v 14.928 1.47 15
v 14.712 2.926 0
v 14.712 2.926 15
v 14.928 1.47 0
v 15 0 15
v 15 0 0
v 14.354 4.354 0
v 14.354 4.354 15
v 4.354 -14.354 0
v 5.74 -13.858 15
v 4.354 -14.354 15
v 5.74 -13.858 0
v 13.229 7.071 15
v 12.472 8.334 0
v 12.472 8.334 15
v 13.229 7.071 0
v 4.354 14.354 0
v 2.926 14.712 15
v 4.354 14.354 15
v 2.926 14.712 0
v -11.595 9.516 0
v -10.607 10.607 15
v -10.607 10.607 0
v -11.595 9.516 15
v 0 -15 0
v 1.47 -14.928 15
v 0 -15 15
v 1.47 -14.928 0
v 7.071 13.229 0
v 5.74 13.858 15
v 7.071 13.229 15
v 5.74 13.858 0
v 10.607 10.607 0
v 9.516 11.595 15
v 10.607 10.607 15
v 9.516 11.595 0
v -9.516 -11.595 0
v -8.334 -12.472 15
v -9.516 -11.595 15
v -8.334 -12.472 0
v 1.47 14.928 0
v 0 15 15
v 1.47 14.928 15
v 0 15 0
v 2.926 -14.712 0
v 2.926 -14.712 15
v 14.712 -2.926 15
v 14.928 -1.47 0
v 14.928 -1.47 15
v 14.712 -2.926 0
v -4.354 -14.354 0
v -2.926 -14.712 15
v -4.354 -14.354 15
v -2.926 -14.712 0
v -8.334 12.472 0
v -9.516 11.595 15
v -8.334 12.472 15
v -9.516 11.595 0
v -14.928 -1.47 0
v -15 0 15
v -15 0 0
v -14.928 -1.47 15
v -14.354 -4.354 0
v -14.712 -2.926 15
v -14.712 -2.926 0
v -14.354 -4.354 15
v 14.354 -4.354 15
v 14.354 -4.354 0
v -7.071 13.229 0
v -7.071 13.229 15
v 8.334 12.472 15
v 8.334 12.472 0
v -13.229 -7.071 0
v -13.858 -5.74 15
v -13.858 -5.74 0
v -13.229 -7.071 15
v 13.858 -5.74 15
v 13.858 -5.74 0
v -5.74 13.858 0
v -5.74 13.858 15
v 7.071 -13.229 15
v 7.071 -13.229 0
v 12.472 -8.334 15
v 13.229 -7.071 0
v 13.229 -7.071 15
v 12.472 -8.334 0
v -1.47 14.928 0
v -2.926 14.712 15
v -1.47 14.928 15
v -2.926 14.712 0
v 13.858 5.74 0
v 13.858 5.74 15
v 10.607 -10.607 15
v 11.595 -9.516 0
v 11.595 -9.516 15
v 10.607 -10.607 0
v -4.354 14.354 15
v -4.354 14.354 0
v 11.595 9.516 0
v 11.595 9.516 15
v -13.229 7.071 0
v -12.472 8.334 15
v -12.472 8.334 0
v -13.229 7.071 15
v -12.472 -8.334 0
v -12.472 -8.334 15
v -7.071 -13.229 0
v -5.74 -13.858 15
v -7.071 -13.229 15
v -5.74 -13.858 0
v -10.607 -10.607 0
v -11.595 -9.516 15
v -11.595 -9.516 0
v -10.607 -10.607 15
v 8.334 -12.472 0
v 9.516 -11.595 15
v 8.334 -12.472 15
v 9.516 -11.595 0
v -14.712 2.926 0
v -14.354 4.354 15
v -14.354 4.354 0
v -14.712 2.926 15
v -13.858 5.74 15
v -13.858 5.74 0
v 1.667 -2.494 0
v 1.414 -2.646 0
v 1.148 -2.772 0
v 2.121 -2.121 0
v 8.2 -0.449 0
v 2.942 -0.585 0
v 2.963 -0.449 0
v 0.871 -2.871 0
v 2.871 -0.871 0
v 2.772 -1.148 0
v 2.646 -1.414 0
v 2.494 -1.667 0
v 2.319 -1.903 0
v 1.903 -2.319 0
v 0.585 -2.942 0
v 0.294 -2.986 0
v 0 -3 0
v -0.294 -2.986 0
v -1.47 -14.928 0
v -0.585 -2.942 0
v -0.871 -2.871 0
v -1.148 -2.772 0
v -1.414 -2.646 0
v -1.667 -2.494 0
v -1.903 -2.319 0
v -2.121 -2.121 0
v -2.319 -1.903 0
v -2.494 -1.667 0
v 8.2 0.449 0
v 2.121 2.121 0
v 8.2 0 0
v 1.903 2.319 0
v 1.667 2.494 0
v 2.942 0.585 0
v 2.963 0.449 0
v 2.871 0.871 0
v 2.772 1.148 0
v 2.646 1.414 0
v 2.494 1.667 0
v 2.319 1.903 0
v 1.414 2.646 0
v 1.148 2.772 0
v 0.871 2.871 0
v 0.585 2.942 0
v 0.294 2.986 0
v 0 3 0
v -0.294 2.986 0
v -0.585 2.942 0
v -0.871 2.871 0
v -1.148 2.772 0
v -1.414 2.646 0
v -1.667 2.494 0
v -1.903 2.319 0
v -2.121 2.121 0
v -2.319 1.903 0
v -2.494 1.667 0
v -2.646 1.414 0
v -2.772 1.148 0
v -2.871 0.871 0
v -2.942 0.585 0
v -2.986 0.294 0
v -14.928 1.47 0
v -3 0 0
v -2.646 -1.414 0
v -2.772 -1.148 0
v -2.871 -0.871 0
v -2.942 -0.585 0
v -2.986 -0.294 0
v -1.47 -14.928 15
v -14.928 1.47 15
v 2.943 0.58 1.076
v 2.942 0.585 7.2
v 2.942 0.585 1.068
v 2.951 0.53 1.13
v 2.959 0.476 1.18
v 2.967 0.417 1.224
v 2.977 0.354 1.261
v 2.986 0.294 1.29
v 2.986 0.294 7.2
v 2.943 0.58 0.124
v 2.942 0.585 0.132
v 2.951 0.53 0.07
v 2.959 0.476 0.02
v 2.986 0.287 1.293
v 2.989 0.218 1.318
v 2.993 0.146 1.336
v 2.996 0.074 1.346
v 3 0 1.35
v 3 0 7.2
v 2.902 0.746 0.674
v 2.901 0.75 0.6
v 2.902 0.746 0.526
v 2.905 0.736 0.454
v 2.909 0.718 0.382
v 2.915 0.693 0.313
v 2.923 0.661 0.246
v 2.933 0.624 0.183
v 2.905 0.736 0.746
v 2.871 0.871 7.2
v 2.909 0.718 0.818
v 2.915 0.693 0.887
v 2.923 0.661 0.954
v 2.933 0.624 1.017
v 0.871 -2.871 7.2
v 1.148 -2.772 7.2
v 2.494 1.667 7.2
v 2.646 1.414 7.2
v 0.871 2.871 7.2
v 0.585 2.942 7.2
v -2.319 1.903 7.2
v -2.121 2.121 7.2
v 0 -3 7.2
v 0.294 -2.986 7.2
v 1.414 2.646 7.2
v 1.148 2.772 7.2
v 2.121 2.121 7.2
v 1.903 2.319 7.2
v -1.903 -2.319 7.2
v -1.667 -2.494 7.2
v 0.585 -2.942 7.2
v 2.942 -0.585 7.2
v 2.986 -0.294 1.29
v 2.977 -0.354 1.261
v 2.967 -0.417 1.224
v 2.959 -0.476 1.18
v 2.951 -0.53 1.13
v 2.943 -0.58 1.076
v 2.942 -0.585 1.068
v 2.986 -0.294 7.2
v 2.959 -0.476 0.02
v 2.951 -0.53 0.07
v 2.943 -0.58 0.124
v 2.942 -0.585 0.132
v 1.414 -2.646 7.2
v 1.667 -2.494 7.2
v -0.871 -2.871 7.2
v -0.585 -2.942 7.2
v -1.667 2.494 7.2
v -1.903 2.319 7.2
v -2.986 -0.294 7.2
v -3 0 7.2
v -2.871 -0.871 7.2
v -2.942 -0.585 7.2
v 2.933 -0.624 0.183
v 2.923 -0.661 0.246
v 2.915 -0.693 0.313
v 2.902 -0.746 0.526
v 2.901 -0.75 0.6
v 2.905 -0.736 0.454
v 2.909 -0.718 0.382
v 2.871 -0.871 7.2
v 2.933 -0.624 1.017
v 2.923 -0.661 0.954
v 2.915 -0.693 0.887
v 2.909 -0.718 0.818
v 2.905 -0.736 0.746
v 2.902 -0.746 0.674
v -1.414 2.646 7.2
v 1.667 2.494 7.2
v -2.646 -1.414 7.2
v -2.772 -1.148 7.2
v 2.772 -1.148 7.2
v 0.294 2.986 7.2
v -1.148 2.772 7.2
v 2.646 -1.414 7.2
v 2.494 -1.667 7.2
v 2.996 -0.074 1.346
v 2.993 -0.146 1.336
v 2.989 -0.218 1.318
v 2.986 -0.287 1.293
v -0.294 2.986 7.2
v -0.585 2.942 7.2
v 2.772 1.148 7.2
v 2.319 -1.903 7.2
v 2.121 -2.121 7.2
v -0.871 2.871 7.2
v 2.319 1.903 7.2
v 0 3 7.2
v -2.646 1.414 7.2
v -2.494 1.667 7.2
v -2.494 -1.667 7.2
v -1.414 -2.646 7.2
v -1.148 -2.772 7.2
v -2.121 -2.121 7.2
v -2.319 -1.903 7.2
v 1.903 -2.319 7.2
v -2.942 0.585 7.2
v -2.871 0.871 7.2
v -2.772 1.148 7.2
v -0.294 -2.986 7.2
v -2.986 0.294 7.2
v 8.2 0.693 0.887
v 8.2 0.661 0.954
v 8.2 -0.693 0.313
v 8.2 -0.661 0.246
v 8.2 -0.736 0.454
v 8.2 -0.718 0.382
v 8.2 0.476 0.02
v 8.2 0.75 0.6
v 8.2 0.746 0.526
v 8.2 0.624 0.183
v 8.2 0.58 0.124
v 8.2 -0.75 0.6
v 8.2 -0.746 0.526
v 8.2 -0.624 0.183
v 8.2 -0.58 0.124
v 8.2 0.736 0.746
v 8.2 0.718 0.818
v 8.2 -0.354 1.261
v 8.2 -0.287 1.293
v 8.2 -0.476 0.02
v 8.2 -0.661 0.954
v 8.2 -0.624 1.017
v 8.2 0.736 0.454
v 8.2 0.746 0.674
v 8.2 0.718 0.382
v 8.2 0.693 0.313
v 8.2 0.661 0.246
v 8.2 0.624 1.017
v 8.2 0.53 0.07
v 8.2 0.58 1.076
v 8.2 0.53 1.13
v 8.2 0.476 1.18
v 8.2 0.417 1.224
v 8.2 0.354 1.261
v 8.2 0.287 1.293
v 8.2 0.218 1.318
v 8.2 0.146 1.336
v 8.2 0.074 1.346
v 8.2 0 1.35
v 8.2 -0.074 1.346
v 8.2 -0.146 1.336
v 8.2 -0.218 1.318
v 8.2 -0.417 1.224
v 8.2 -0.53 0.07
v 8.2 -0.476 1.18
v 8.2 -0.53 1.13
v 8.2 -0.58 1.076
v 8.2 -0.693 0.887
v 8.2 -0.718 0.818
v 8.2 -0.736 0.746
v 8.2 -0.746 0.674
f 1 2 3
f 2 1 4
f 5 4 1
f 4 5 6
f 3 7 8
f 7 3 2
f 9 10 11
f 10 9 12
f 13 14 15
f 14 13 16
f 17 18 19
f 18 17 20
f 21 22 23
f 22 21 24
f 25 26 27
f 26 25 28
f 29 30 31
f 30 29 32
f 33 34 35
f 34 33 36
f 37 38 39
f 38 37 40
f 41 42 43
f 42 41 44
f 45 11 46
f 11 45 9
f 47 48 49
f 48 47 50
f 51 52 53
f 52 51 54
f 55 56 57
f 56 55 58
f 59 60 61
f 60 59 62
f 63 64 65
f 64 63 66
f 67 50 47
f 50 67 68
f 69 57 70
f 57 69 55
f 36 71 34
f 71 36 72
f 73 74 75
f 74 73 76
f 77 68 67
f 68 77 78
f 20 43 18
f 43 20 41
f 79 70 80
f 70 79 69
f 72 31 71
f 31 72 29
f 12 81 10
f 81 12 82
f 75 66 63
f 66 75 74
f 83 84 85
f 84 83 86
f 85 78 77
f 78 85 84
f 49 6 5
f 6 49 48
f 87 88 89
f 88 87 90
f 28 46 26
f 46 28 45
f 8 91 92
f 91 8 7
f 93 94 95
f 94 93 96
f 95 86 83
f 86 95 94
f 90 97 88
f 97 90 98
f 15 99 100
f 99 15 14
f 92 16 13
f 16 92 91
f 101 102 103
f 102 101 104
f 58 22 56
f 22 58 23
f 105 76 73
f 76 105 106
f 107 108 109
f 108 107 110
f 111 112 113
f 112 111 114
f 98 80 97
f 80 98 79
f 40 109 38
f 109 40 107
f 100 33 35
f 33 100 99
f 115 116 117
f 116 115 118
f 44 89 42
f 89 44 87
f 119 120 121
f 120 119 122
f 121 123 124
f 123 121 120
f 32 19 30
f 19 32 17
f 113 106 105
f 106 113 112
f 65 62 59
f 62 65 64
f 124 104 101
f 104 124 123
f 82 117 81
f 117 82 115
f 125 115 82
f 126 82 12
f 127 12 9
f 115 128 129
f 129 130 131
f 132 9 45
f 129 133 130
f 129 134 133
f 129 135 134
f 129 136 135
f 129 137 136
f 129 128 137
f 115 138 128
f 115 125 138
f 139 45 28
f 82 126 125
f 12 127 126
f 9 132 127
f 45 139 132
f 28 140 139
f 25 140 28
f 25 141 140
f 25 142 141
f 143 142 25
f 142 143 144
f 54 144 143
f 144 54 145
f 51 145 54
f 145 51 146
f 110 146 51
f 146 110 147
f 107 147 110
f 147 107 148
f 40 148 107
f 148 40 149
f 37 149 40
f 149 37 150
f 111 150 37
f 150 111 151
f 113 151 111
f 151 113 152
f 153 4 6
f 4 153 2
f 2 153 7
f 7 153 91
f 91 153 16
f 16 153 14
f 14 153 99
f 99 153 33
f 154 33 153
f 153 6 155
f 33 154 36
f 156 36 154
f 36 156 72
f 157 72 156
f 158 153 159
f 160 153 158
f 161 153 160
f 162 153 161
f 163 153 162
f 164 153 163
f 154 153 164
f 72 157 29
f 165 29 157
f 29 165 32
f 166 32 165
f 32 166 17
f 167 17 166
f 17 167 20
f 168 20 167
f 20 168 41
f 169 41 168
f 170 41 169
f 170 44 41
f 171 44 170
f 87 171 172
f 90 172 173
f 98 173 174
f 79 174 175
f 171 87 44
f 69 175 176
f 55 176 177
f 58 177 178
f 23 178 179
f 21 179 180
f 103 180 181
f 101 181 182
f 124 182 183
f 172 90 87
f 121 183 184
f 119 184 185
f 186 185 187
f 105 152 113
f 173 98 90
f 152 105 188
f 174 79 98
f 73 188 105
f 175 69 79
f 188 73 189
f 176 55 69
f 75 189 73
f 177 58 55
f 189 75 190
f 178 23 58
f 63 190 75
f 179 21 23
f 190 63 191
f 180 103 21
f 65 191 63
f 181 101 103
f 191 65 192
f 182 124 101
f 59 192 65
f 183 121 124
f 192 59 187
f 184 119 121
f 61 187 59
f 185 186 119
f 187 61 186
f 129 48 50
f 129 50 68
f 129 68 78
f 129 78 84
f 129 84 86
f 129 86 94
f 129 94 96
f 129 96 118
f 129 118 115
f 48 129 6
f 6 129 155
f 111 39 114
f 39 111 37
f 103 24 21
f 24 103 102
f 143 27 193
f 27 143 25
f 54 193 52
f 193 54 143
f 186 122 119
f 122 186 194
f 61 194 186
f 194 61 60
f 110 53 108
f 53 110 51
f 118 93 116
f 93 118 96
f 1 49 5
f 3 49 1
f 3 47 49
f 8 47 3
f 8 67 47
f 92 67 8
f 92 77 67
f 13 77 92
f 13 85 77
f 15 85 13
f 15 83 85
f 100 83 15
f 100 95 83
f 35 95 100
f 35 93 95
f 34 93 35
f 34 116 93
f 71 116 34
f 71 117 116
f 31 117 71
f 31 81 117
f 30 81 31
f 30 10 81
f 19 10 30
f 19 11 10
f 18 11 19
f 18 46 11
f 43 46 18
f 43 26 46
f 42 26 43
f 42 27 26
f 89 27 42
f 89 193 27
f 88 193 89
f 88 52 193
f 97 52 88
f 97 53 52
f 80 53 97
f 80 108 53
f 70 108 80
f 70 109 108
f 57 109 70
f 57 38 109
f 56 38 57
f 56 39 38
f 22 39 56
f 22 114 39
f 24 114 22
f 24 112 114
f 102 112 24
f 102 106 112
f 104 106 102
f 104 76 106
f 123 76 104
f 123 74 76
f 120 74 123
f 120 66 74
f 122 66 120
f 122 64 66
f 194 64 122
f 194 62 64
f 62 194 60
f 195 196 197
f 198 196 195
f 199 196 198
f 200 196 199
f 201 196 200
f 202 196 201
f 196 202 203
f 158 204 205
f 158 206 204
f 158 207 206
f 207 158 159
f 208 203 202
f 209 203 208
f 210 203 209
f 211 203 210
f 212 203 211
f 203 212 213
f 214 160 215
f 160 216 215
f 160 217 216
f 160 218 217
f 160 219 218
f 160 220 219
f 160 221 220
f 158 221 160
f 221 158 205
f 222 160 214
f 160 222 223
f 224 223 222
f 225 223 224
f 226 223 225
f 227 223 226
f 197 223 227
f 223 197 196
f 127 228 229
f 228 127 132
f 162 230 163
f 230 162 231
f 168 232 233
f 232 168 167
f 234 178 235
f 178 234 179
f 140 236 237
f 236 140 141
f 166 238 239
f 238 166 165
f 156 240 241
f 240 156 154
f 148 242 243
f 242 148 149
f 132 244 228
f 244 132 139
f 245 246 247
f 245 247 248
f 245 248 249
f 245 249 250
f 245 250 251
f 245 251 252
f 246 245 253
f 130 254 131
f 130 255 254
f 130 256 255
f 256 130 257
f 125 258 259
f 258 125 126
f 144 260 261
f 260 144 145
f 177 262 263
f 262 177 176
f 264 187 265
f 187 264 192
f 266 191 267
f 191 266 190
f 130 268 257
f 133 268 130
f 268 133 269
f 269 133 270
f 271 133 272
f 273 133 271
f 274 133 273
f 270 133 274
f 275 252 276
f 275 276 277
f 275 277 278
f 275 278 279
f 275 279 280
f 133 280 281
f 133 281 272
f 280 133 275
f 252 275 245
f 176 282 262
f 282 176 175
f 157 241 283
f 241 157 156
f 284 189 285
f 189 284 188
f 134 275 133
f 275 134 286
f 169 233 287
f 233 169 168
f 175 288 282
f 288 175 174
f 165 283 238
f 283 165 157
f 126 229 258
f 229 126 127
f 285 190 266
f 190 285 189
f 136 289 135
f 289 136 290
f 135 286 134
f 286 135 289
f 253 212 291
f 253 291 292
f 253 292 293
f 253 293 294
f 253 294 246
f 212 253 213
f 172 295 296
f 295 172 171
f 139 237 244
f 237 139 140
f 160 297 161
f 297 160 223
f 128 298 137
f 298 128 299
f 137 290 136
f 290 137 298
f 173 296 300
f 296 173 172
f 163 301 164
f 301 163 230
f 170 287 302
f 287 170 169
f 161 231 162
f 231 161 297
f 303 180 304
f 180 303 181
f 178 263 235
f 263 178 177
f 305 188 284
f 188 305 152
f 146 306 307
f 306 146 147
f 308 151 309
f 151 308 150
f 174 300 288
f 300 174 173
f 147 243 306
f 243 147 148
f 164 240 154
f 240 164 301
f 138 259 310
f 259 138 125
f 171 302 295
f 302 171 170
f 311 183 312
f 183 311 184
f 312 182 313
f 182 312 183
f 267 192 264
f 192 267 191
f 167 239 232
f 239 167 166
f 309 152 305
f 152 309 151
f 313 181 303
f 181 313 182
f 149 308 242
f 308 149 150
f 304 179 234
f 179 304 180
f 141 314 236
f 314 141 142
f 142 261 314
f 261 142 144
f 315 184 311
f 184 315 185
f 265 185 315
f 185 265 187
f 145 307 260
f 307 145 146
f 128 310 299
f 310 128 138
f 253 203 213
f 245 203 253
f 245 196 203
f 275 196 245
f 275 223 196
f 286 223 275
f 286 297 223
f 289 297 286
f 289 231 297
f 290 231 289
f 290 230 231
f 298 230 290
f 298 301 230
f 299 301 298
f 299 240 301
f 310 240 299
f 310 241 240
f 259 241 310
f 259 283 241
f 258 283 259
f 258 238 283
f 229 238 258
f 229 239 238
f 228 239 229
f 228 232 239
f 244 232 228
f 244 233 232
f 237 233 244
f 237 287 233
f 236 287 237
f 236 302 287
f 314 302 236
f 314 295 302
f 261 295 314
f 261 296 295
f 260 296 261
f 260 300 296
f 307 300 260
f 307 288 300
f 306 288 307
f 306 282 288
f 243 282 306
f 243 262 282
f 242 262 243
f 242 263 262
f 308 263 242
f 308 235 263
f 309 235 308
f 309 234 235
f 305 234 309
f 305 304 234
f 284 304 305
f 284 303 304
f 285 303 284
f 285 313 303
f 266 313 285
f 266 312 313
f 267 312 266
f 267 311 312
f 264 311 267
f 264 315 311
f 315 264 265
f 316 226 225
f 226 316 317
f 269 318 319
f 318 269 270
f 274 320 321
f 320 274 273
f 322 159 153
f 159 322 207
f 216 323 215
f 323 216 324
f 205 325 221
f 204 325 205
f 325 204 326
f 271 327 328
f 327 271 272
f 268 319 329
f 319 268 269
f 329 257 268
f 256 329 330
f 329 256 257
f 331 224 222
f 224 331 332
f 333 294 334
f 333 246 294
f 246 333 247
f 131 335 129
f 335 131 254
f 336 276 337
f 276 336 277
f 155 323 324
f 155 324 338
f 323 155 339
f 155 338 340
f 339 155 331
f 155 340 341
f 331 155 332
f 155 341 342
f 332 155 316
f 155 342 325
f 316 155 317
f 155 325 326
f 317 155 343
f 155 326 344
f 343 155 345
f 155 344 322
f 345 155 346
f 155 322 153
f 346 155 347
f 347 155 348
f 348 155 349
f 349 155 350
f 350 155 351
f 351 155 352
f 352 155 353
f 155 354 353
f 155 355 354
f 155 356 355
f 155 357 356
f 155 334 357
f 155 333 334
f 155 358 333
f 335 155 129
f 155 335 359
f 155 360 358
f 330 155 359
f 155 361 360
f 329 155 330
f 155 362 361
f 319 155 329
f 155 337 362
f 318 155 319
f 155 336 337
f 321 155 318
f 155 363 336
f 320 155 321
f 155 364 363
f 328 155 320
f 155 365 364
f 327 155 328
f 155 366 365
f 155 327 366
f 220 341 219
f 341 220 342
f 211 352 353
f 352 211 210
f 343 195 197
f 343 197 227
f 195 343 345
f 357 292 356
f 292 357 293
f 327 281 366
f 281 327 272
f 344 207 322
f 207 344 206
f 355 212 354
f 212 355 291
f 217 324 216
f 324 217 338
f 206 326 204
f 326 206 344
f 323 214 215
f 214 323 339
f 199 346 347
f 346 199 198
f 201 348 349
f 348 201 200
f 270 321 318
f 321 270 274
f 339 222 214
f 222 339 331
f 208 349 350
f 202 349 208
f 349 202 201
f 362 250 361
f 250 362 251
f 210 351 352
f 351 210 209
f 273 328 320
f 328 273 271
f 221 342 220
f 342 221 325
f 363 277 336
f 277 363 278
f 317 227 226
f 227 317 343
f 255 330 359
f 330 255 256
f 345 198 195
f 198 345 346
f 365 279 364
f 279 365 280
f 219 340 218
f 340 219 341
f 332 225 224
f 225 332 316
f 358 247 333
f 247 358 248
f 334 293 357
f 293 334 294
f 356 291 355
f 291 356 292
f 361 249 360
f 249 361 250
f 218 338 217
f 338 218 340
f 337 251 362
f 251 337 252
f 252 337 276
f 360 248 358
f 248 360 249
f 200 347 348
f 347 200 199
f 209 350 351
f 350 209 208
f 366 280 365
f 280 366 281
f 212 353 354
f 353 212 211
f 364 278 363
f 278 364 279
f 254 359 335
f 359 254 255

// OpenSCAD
// Replacement knob for a hotplate stirrer - a cylinder with a D-shaped shaft bore and an
// external grip grooved surface. NOVEL general part.
//

shaft_d   = 6;
knob_d    = 30;
knob_h    = 15;
bore_d    = 6.2;
grooves   = 18;
pointer_w = 1.5;

$fn = 64;

difference() {
    cylinder(h = knob_h, d = knob_d);

    for (i = [0 : grooves - 1])
        translate([0, 0, -1])
            rotate([0, 90, 0])
                cylinder(h = knob_h + 2, d = 2);

    translate([0, 0, -1])
        cylinder(h = bore_d + 2, d = shaft_d);

    translate([0, 0, -1])
        cylinder(h = bore_d + 2, d = shaft_d);
    translate([0, 0, -1])
        rotate([0, 90, 0])
            translate([-(bore_d / 2 - 1.5), 0, 0])
                cylinder(h = bore_d + 2, d = pointer_w);
}
